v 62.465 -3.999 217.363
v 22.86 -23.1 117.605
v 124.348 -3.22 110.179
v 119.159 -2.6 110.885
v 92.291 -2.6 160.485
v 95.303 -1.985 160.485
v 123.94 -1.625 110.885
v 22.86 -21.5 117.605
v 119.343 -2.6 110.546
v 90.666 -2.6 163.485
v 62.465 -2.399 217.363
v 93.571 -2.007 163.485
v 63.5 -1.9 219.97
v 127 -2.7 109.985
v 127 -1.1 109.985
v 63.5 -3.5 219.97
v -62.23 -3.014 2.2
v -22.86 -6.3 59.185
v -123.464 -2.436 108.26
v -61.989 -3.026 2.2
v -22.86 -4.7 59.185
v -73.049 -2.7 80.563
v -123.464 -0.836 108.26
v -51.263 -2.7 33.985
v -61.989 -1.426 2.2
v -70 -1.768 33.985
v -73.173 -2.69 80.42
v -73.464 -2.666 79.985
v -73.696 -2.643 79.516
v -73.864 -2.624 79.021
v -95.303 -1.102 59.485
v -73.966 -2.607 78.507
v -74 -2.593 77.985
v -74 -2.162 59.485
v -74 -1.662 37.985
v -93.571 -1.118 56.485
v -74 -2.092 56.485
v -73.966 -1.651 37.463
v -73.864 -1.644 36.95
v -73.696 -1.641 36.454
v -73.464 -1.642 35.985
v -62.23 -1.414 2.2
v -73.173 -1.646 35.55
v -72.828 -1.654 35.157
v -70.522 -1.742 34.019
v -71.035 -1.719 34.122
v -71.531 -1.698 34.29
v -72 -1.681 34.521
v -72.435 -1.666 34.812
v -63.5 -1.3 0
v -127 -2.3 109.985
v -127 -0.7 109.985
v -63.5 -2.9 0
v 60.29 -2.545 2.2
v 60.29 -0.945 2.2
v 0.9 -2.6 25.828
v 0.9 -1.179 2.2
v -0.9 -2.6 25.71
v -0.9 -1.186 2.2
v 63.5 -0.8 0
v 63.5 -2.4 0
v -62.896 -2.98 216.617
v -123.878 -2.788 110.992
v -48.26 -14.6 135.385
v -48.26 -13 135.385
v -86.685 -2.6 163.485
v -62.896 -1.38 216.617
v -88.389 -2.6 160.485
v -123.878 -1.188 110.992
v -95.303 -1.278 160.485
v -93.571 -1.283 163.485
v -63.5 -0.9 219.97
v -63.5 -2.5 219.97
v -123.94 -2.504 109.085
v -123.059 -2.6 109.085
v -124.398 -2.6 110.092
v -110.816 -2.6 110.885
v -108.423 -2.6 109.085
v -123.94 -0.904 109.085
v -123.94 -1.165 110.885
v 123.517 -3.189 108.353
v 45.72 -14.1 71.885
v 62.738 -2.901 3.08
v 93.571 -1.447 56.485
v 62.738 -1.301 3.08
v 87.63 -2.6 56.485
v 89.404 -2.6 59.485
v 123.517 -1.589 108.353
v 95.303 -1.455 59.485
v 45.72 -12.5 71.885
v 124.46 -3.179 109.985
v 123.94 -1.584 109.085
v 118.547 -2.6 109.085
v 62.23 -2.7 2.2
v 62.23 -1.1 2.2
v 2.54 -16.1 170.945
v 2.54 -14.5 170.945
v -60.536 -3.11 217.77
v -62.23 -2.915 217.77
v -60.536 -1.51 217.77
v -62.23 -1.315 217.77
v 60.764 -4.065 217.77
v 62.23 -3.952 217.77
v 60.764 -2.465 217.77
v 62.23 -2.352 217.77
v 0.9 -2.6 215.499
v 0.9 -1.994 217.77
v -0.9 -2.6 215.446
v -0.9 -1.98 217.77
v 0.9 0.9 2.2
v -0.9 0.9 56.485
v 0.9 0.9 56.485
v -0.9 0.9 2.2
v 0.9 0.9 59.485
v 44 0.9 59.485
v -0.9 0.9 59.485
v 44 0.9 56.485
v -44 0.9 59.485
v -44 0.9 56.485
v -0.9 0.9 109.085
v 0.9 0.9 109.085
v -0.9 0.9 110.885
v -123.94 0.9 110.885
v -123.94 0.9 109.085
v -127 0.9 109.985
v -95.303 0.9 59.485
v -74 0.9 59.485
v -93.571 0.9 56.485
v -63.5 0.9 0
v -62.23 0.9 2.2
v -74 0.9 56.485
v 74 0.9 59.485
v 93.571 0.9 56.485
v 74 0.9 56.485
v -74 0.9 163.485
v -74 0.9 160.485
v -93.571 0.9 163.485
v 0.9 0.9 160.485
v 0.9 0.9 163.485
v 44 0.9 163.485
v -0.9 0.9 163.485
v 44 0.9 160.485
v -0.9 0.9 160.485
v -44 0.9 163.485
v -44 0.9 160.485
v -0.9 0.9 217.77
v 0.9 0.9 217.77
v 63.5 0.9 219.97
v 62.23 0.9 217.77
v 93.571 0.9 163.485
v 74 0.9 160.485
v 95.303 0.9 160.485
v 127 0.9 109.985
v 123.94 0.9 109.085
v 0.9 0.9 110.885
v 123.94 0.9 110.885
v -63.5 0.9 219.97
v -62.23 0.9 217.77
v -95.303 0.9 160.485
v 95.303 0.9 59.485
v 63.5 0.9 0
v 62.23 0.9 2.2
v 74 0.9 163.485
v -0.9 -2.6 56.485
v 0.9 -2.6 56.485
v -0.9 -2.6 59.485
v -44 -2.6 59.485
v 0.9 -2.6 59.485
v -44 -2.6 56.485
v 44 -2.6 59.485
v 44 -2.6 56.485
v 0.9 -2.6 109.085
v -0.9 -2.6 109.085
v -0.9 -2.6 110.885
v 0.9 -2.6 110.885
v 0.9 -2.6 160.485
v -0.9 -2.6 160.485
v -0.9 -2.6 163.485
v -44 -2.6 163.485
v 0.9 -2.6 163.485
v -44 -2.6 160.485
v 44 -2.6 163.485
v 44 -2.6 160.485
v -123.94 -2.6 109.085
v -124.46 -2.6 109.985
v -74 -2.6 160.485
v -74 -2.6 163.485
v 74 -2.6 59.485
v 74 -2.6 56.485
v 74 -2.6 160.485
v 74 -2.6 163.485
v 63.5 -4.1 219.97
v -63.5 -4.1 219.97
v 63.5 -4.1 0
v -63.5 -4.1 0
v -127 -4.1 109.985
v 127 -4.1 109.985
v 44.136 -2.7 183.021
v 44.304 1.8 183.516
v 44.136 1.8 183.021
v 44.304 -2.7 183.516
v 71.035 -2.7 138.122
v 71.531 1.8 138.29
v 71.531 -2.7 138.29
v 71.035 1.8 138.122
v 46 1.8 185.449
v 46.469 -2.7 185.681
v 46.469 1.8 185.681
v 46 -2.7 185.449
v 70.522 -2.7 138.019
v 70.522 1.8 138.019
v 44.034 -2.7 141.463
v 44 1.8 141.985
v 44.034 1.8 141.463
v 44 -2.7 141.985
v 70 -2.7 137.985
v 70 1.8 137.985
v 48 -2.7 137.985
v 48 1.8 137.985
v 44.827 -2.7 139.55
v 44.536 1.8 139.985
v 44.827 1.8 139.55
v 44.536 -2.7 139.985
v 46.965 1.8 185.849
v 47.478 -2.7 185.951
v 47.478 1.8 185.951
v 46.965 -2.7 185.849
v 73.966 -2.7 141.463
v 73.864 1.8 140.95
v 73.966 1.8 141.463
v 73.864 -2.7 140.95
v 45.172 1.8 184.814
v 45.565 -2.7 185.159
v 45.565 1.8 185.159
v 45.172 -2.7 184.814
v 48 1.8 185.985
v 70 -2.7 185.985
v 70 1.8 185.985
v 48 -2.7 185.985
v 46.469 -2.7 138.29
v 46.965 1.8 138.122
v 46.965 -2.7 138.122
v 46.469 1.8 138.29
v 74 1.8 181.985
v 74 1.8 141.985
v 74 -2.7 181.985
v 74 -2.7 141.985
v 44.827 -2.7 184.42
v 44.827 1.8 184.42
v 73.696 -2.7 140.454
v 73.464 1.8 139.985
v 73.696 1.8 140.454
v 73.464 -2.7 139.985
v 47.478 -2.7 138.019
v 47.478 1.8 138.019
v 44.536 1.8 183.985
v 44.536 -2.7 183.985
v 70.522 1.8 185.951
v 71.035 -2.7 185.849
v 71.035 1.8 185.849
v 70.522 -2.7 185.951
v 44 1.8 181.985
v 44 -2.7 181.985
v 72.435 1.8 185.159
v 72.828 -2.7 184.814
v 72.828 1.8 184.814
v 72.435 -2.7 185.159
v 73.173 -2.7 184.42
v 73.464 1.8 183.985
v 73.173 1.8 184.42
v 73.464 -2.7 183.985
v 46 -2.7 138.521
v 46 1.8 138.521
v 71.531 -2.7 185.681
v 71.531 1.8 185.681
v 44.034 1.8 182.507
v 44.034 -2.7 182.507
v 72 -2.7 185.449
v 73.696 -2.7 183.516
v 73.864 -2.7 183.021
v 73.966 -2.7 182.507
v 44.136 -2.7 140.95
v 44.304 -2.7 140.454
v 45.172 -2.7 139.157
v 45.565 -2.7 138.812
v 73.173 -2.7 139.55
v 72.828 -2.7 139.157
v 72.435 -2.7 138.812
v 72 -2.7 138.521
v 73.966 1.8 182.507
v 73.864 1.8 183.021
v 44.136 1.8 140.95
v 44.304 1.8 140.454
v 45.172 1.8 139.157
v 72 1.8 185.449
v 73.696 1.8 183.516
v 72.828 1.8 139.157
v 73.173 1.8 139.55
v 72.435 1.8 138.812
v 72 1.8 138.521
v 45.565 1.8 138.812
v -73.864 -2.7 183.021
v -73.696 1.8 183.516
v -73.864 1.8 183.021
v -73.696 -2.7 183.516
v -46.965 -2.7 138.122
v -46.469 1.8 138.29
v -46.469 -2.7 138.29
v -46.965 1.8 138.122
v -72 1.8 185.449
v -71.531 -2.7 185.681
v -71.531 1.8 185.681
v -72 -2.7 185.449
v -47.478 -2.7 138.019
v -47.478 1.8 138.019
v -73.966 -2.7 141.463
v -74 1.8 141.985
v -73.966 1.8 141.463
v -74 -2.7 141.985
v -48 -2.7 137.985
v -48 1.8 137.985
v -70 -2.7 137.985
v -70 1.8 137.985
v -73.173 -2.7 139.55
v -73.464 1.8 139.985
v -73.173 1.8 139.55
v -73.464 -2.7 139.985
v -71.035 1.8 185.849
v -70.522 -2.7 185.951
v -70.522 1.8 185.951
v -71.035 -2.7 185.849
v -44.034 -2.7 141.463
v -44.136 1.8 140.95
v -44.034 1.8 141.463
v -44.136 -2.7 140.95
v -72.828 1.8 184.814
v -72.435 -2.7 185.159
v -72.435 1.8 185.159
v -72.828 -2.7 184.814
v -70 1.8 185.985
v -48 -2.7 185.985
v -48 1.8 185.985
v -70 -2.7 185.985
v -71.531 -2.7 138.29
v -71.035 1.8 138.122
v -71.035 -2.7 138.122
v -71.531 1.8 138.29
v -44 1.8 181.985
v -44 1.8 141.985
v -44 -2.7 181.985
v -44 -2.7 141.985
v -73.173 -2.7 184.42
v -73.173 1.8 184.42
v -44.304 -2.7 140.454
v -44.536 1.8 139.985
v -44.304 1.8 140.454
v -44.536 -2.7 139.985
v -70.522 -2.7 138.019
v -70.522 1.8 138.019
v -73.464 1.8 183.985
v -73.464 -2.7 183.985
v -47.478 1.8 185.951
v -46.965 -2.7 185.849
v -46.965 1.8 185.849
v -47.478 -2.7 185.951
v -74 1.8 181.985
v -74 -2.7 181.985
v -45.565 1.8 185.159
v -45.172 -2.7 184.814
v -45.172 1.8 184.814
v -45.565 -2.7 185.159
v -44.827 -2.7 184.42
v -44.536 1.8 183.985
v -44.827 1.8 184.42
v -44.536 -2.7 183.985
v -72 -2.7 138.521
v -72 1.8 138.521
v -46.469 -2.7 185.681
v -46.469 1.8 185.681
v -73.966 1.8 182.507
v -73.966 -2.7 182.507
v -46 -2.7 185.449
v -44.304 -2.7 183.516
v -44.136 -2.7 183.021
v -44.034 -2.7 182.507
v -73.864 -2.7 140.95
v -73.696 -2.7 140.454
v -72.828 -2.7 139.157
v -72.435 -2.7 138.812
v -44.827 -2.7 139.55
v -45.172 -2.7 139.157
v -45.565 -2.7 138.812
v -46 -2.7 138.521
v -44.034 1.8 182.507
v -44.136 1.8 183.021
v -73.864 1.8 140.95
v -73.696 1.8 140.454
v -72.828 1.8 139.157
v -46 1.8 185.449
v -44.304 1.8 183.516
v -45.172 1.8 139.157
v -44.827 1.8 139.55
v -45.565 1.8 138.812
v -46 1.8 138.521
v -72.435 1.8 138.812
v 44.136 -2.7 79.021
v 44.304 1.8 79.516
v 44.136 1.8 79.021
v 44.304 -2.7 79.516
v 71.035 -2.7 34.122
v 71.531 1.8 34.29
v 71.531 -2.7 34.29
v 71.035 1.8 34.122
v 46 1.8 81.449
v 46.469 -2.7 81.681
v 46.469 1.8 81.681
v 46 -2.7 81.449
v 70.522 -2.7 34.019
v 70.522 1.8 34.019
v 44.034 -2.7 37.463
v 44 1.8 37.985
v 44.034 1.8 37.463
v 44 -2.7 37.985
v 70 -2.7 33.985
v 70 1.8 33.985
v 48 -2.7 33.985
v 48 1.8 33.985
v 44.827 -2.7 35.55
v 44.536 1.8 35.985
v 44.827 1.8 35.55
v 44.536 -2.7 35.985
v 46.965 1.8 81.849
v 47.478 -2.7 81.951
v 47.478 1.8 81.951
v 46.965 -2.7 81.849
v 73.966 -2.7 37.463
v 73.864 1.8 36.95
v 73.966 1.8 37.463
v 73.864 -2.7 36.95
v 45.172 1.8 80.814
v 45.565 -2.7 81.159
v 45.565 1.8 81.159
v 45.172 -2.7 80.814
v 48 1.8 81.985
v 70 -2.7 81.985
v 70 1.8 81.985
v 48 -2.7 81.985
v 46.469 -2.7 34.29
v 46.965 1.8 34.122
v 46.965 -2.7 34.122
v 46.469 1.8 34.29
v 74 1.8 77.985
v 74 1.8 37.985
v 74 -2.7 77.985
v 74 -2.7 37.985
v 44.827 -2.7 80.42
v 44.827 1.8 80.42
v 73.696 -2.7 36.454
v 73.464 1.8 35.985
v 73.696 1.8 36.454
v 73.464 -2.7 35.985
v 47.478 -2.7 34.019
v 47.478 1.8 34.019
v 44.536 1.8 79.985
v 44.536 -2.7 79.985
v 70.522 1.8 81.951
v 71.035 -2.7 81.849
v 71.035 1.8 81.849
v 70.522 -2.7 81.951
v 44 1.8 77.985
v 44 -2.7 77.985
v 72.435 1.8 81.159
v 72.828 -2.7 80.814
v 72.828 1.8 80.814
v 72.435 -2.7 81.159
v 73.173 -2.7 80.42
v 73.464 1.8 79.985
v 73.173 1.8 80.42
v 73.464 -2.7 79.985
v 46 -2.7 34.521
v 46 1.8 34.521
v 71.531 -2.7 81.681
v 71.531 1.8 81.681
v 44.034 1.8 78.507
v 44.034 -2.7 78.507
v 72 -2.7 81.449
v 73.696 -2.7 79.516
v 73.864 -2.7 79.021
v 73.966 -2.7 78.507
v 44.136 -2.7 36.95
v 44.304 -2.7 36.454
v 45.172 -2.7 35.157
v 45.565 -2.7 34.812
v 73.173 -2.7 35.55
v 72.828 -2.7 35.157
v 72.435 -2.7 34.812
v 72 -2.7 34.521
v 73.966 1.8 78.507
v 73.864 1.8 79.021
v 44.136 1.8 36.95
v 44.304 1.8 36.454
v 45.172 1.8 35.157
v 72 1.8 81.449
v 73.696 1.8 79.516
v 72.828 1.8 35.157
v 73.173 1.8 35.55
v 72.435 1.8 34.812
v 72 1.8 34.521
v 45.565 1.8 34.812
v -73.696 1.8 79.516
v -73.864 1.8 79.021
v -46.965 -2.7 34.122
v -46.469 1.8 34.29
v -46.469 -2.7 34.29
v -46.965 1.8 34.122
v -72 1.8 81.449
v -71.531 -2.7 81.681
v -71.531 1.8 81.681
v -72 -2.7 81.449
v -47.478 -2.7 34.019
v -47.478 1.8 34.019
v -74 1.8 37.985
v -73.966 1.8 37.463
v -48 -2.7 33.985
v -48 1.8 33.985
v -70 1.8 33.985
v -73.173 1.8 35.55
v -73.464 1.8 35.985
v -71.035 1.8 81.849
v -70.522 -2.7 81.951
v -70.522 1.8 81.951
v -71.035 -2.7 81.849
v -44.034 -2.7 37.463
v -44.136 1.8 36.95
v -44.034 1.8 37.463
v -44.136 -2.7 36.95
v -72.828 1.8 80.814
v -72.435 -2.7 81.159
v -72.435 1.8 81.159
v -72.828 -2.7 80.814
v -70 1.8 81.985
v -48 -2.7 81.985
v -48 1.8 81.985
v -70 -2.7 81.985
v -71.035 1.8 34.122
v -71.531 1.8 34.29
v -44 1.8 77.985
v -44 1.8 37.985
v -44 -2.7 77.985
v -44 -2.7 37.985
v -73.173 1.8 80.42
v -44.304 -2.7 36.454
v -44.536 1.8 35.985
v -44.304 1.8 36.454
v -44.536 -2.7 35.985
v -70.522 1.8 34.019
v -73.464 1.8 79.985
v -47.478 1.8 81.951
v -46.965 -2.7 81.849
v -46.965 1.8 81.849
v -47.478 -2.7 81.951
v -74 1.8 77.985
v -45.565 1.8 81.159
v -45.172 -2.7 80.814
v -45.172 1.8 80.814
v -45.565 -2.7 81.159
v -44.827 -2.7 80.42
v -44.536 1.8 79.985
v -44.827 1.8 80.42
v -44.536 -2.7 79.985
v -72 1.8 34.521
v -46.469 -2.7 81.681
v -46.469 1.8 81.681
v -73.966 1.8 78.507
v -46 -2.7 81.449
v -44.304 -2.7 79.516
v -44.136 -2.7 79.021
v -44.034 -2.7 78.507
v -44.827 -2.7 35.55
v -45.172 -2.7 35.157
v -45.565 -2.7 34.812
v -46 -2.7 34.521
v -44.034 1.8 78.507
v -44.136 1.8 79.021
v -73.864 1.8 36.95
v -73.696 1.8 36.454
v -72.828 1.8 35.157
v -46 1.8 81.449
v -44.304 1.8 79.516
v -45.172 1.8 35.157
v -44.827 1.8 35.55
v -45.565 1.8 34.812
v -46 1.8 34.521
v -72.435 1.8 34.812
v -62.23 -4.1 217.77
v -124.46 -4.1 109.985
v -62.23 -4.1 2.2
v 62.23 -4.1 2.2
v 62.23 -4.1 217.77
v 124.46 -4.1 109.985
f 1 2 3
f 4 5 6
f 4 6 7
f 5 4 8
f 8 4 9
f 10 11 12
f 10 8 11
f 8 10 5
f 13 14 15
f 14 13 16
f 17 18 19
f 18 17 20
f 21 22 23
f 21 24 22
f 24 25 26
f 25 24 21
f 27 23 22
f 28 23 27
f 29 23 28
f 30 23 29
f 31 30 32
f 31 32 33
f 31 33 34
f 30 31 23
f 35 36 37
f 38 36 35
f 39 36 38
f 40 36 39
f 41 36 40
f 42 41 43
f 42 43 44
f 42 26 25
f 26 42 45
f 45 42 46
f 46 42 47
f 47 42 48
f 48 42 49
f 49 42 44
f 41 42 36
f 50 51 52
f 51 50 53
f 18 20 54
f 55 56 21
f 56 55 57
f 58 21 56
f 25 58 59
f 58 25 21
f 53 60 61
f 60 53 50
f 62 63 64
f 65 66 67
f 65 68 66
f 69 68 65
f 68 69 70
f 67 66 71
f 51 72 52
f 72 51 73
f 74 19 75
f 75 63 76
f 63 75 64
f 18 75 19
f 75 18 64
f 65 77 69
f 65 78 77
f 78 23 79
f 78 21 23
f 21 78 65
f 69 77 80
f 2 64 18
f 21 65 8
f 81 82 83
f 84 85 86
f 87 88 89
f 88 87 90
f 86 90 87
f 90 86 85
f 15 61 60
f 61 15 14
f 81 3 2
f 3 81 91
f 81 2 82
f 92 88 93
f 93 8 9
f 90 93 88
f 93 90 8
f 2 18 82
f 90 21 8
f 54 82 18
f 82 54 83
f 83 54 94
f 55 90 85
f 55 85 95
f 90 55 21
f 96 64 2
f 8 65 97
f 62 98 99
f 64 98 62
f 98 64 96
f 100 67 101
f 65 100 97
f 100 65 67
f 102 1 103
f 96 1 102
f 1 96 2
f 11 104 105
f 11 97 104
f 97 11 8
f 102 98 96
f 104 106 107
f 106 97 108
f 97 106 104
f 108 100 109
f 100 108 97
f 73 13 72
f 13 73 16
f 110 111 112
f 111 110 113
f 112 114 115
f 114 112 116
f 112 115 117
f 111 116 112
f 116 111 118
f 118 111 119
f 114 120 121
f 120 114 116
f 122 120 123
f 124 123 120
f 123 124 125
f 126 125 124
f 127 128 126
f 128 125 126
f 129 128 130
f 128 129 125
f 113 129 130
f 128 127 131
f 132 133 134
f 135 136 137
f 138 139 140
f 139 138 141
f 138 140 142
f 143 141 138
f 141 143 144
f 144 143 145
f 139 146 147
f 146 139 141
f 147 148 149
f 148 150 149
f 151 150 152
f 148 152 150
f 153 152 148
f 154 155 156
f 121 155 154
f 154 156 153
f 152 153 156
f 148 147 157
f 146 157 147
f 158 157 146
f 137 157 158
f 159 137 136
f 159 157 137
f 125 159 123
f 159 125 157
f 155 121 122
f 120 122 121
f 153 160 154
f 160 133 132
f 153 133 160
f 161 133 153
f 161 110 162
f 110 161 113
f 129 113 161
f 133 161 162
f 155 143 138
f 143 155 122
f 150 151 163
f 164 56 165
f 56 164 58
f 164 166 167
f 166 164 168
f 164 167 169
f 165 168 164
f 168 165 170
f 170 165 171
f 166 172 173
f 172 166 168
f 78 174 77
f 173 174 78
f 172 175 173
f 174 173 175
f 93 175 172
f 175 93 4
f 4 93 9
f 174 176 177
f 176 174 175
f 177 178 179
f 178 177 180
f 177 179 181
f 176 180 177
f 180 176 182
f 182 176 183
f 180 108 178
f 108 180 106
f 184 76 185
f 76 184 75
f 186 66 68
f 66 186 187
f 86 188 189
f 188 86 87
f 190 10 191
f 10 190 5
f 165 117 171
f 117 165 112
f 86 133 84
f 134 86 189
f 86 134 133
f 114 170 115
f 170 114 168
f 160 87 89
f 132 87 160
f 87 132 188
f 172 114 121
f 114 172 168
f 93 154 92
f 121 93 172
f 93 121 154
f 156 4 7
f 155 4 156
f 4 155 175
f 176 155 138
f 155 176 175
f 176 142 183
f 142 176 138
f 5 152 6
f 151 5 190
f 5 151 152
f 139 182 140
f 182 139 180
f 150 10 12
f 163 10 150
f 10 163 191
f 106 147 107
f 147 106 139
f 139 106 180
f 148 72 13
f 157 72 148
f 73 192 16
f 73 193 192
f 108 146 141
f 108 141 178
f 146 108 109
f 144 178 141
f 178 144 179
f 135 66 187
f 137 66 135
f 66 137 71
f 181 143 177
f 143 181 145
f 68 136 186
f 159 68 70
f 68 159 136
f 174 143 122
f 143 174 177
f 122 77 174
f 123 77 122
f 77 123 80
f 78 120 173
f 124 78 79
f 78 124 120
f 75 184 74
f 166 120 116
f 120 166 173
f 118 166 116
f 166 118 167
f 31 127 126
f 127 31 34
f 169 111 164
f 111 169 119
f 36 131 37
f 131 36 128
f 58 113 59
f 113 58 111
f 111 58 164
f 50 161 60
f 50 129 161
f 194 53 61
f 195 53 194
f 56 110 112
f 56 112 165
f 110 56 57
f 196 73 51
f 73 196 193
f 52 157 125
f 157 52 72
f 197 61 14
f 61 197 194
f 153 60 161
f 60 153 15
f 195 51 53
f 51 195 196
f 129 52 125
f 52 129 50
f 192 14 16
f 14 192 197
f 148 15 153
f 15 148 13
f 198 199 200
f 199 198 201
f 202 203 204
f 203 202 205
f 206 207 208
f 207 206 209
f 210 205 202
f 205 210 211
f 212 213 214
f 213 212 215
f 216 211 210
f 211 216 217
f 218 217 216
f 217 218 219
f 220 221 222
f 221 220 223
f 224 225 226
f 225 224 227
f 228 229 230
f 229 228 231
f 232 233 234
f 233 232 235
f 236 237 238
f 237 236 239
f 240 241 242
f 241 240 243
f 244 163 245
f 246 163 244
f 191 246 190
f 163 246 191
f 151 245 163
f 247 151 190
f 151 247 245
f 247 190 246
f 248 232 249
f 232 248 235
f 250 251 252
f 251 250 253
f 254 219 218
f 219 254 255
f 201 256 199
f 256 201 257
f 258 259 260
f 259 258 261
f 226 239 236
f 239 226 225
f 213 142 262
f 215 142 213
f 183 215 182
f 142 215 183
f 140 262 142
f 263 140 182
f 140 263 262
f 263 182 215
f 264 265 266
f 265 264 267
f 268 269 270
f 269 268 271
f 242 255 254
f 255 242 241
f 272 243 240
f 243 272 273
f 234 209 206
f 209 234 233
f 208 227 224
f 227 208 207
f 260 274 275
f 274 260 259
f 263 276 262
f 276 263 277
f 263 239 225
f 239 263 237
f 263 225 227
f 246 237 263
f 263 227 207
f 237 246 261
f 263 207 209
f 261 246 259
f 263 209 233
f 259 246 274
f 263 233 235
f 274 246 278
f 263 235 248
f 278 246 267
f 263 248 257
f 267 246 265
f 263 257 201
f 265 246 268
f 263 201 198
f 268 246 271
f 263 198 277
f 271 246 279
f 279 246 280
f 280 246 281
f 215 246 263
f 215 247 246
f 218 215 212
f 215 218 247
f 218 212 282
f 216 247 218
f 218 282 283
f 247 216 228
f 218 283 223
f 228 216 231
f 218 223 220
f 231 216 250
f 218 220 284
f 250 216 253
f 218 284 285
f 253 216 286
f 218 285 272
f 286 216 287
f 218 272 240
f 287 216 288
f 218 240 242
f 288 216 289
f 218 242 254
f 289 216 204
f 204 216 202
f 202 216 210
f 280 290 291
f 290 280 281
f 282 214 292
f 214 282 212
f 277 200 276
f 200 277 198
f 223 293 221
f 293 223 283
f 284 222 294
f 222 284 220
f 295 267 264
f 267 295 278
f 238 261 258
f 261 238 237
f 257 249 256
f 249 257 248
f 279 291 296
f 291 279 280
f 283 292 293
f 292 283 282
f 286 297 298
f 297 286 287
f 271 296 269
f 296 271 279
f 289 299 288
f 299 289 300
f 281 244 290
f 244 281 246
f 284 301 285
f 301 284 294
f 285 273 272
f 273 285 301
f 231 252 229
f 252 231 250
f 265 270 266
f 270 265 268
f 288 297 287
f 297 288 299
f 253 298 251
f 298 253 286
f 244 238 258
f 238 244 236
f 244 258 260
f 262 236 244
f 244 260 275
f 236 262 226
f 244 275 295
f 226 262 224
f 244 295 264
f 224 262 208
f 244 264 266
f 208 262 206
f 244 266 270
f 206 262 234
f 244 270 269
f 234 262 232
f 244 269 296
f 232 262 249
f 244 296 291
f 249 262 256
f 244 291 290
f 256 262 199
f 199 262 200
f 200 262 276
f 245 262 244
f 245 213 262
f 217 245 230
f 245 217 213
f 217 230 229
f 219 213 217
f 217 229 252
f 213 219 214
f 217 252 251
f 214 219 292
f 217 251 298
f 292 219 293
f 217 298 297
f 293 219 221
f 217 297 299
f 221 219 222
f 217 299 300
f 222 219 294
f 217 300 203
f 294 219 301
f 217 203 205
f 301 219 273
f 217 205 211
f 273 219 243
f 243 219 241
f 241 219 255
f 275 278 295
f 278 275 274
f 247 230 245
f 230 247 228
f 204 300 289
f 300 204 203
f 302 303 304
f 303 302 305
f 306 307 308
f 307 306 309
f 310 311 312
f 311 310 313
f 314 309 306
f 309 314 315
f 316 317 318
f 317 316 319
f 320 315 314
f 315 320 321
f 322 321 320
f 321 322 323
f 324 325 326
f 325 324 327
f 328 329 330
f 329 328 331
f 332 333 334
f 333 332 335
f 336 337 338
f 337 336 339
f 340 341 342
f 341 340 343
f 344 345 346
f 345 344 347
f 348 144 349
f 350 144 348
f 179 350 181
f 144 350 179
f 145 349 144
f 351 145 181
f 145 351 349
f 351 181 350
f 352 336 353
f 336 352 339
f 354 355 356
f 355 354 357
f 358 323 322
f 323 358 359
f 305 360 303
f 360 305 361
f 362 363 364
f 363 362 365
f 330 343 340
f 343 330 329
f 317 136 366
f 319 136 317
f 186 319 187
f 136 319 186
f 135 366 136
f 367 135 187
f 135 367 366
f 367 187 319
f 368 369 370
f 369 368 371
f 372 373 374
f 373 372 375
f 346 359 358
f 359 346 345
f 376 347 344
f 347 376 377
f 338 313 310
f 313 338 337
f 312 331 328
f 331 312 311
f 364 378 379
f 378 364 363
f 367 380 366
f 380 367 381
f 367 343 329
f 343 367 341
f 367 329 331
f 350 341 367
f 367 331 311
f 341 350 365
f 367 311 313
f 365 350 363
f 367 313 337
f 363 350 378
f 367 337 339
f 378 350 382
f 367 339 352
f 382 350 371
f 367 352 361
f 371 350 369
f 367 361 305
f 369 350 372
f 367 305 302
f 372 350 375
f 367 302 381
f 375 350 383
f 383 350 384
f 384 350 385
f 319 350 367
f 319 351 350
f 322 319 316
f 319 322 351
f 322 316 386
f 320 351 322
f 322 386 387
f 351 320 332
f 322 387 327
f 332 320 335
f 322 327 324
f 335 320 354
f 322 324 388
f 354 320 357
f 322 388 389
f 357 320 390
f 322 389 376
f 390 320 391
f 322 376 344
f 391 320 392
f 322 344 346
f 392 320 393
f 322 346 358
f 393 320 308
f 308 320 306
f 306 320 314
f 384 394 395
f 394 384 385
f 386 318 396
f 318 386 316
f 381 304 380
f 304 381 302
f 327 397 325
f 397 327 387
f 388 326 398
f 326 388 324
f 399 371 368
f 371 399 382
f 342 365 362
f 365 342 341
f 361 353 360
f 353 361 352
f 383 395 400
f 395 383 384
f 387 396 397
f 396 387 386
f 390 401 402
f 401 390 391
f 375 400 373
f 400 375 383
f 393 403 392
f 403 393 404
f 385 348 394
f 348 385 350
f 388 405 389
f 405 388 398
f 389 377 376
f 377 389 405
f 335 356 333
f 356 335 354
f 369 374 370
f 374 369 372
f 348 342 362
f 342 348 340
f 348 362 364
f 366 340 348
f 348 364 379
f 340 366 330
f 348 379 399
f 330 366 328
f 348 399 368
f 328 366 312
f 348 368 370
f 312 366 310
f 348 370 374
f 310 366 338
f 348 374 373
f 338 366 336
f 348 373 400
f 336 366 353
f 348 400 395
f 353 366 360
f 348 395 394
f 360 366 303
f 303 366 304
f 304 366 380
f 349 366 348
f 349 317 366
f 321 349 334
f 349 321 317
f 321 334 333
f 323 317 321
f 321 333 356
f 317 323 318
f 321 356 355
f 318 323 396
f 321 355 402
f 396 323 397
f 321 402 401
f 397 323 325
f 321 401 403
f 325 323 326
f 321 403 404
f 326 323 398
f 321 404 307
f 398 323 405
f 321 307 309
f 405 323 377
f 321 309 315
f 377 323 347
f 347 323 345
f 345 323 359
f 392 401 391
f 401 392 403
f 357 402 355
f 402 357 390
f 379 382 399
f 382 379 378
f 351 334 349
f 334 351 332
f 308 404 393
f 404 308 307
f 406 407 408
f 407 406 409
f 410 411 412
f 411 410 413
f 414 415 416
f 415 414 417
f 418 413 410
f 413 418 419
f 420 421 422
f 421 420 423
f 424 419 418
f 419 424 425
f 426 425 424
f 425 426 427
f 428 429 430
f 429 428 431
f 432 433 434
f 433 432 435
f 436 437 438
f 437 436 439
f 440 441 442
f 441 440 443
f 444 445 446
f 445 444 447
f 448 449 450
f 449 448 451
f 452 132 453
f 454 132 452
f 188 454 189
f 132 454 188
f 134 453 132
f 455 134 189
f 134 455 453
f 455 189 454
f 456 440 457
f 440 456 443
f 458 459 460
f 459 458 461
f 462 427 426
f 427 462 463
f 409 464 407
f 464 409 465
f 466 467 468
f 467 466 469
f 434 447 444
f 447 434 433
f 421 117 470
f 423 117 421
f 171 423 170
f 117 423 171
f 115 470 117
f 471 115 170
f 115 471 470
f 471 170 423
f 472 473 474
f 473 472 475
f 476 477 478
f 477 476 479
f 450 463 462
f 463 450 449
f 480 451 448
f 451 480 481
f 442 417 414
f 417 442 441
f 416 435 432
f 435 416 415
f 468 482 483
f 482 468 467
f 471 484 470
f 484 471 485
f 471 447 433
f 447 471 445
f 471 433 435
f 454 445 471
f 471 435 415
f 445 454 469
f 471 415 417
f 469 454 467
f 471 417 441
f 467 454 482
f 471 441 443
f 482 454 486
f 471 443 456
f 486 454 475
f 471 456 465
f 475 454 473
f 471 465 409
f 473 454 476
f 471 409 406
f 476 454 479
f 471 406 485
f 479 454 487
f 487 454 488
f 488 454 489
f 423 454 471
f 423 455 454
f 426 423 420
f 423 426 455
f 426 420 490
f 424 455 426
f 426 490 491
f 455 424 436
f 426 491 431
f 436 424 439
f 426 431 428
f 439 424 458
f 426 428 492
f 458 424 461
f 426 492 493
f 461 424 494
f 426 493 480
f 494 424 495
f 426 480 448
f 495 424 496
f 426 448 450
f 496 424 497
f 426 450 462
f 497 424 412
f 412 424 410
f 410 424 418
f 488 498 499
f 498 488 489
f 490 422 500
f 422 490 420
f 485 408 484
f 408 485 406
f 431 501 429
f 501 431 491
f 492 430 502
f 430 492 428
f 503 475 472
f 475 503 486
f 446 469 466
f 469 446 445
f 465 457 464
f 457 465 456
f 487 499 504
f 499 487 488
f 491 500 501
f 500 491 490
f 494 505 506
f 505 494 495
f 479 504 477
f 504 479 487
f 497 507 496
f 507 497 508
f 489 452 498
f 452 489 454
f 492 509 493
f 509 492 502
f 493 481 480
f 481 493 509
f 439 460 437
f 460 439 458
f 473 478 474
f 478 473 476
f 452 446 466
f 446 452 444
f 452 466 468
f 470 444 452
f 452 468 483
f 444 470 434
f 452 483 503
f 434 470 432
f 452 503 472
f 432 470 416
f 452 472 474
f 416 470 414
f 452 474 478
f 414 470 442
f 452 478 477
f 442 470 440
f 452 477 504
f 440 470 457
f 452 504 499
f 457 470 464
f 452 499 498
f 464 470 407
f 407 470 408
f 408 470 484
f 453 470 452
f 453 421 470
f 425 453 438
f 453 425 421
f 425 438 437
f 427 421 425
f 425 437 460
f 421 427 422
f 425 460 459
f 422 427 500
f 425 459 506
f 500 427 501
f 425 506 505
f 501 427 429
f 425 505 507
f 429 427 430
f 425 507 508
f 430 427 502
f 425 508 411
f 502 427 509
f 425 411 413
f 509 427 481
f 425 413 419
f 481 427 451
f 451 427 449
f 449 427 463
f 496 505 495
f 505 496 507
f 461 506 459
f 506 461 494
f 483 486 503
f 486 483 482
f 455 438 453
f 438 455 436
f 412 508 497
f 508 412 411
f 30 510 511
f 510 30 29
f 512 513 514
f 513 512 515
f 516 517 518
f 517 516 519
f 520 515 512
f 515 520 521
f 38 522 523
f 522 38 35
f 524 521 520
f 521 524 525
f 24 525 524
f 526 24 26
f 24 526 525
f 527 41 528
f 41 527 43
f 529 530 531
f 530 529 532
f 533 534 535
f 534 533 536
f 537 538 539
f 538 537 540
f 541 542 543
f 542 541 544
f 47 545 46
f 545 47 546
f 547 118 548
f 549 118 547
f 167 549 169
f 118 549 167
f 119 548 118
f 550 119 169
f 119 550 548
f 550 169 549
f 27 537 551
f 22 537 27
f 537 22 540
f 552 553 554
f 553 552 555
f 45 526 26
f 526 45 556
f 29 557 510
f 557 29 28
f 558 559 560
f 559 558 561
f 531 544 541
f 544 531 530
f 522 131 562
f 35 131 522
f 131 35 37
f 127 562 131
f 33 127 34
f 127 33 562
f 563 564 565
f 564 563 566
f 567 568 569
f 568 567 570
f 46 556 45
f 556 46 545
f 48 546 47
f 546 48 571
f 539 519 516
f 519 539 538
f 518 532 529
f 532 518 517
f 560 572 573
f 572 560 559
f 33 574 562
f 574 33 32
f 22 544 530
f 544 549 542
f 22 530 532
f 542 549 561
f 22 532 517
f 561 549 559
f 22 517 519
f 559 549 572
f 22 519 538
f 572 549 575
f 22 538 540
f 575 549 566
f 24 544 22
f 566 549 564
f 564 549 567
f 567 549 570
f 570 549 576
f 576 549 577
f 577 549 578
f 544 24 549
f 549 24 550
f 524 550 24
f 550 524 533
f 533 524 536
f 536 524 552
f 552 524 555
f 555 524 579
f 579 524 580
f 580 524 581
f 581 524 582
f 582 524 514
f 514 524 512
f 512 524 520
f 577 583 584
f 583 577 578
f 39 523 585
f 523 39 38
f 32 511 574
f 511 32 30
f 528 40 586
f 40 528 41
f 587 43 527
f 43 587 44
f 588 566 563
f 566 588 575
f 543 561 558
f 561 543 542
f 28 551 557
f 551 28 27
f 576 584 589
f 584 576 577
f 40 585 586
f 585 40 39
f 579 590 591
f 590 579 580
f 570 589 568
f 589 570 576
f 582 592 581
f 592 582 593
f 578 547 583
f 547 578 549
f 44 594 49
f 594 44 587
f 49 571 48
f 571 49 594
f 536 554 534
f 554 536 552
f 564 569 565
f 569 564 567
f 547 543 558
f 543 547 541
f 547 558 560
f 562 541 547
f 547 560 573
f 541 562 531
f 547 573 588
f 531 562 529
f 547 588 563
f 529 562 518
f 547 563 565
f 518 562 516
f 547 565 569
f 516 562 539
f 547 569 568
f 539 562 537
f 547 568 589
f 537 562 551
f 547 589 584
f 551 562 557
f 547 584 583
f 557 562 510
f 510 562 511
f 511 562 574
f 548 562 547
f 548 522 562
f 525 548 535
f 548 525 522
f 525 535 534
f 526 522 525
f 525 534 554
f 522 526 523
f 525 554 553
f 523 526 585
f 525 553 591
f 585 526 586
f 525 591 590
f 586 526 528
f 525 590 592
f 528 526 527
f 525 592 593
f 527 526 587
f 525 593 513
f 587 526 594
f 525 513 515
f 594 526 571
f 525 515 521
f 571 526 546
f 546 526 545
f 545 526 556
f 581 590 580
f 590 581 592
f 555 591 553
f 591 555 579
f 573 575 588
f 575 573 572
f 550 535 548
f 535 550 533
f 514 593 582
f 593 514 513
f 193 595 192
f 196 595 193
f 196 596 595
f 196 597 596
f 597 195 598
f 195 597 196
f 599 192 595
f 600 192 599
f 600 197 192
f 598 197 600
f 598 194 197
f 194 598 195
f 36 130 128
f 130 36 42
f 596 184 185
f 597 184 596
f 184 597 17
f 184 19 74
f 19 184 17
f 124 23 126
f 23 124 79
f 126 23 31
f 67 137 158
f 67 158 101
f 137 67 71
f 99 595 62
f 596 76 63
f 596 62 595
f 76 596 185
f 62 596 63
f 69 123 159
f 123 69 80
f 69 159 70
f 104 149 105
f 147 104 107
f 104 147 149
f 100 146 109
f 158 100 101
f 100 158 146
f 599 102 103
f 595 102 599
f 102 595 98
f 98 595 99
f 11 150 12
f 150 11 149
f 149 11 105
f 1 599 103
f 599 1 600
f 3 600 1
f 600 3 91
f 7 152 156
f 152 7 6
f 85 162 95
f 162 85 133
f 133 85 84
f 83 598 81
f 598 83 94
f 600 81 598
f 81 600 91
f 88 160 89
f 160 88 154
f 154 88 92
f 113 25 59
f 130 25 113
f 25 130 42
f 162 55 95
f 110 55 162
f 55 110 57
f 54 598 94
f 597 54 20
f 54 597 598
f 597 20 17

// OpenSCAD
/*
  Parametric Faceted Hex Wall Tile v17
  -----------------------------------
  Goals:
    - 10 in point-to-point regular hex by default
    - stronger asymmetric low-poly relief
    - open-back shell for lower weight / faster printing
    - four hidden shallow adhesive mounting pads
    - no perimeter tabs or ears
    - vertical export orientation with a full flat edge on the bed
    - mount load rails separated from general stiffening ribs

  Units: millimeters
*/

$fn = 48;

// ============================================================
// A) GLOBAL QUALITY / EXPORT
// ============================================================
render_orientation  = "vertical"; // "flat" or "vertical"

// ============================================================
// B) TILE SIZE
// ============================================================
point_to_point      = 254.0;   // 10.000 in; left vertex to right vertex

// ============================================================
// C) FACE / RELIEF
// ============================================================
roof_skin           = 1.60;    // vertical skin thickness
edge_relief         = 3.20;    // lower perimeter makes the planes read more strongly
peak_relief         = 24.00;   // dominant architectural peak
secondary_relief    = 15.50;
low_relief          = 7.20;

// Fine-tune the six outer corners clockwise from rightmost.
corner_z = [
    edge_relief + 0.4,  // right
    edge_relief + 1.2,  // upper-right
    edge_relief + 0.2,  // upper-left
    edge_relief + 0.0,  // left
    edge_relief + 0.6,  // lower-left
    edge_relief + 0.1   // lower-right
];

// ============================================================
// D) SHELL
// ============================================================
perimeter_wall      = 2.20;    // wall thickness measured inward
wall_height         = 5.00;    // ensures positive overlap with roof underside

// ============================================================
// E) STRUCTURAL RIBS
// ============================================================
add_cross_ribs      = true;
add_mount_rails     = true;
cross_rib_width     = 1.80;    // general anti-twist ribs
mount_rail_width    = 3.00;    // wider rails carry adhesive-pad loads
rib_height          = 3.50;

// ============================================================
// F) HIDDEN ADHESIVE MOUNTS
// ============================================================
mounts_enabled      = true;
mount_pad_width     = 30.0;
mount_pad_height    = 48.0;
mount_pad_radius    = 4.0;
mount_pad_proud     = 0.90;    // how far pad face sits behind rear plane
mount_core_height   = 3.60;    // core overlaps the structural rails for a positive union
mount_x_offset      = 59.0;
mount_y_offset      = 52.0;

// ============================================================
// G) NUMERICAL / BOOLEAN TOLERANCES
// ============================================================
eps                 = 0.02;

// ============================================================
// H) ADVANCED FACET LAYOUT / DERIVED DIMENSIONS
// ============================================================
R = point_to_point / 2;
H = R * sqrt(3) / 2;
flat_to_flat = 2 * H;

// Normalized XY point set. 0..5 are the regular-hex perimeter.
// 6..10 are deliberately asymmetric interior control points.
xy_norm = [
    [ 1.00,  0.00],
    [ 0.50,  0.8660254038],
    [-0.50,  0.8660254038],
    [-1.00,  0.00],
    [-0.50, -0.8660254038],
    [ 0.50, -0.8660254038],
    [ 0.18,  0.06],   // dominant peak control, pushed off-center
    [-0.38,  0.20],   // left shoulder
    [ 0.36, -0.30],   // lower-right ridge
    [-0.18, -0.40],   // lower basin/transition
    [ 0.02,  0.48]    // upper secondary ridge
];

// Delaunay-style triangulation over the six perimeter and five interior points.
triangles = [
    [1,6,0],
    [4,9,3],
    [5,9,4],
    [7,2,3],
    [9,7,3],
    [7,9,6],
    [8,5,0],
    [6,8,0],
    [9,8,6],
    [5,8,9],
    [10,7,6],
    [7,10,2],
    [1,10,6],
    [2,10,1]
];

// Relief values for all 11 points.
// Interior values are intentionally non-radial to avoid a centered "tent" look.
z_values = [
    corner_z[0],
    corner_z[1],
    corner_z[2],
    corner_z[3],
    corner_z[4],
    corner_z[5],
    peak_relief,              // 6 - dominant peak, slightly right/below center
    secondary_relief,         // 7 - left shoulder
    secondary_relief - 0.5,   // 8 - lower-right ridge
    low_relief,               // 9 - lower transition
    secondary_relief + 1.5    // 10 - upper ridge
];

function pxy(i) = [xy_norm[i][0] * R, xy_norm[i][1] * R];
function p3(i, dz=0) = [pxy(i)[0], pxy(i)[1], z_values[i] + dz];

module hex2d(inset=0) {
    if (inset == 0)
        polygon(points=[for (i=[0:5]) pxy(i)]);
    else
        offset(delta=-inset)
            polygon(points=[for (i=[0:5]) pxy(i)]);
}

module rounded_rect_2d(w, h, r) {
    // offset/square construction stays stable for parameter changes.
    offset(r=r)
        square([max(eps, w-2*r), max(eps, h-2*r)], center=true);
}

module facet_wedge(a, b, c) {
    // A thin, vertically offset triangular roof panel.
    // Unioning all wedges gives a continuous faceted skin.
    pts = [
        p3(a), p3(b), p3(c),
        p3(a, -roof_skin), p3(b, -roof_skin), p3(c, -roof_skin)
    ];

    polyhedron(
        points=pts,
        faces=[
            [0,1,2],      // top
            [5,4,3],      // underside
            [0,3,4,1],
            [1,4,5,2],
            [2,5,3,0]
        ],
        convexity=8
    );
}

module roof_skin_mesh() {
    union() {
        for (t = triangles)
            facet_wedge(t[0], t[1], t[2]);
    }
}

module perimeter_ring() {
    linear_extrude(height=wall_height)
        difference() {
            hex2d();
            hex2d(perimeter_wall);
        }
}

module rear_mount(x, y) {
    // Rear adhesive face is only mount_pad_proud behind the global rear plane.
    // Pads intersect the structural mounting rails.
    // Rails distribute mounting load into the perimeter shell.
    translate([x, y, -mount_pad_proud])
        linear_extrude(height=mount_core_height + mount_pad_proud)
            rounded_rect_2d(mount_pad_width, mount_pad_height, mount_pad_radius);
}

module structural_ribs() {
    // General ribs stabilize the open shell; wider mount rails tie the
    // adhesive pads mechanically into the perimeter.
    if (add_cross_ribs || add_mount_rails) {
        intersection() {
            linear_extrude(height=rib_height)
                union() {
                    if (add_cross_ribs) {
                        square([point_to_point, cross_rib_width], center=true);
                        square([cross_rib_width, flat_to_flat], center=true);
                    }

                    if (add_mount_rails) {
                        // These rails pass directly through the four pad centers
                        // and reach the perimeter ring at both ends.
                        translate([0, mount_y_offset])
                            square([point_to_point, mount_rail_width], center=true);
                        translate([0, -mount_y_offset])
                            square([point_to_point, mount_rail_width], center=true);
                    }
                }
            linear_extrude(height=rib_height)
                hex2d();
        }
    }
}

module tile_flat() {
    union() {
        roof_skin_mesh();
        perimeter_ring();
        structural_ribs();

        if (mounts_enabled) {
            rear_mount( mount_x_offset,  mount_y_offset);
            rear_mount(-mount_x_offset,  mount_y_offset);
            rear_mount( mount_x_offset, -mount_y_offset);
            rear_mount(-mount_x_offset, -mount_y_offset);
        }
    }
}

module final_model() {
    if (render_orientation == "vertical") {
        // Rotate so the original lower flat of the hex becomes the print-bed edge.
        // Move rear-most adhesive faces up to Y=0 for predictable slicer placement.
        translate([0, mount_pad_proud, H])
            rotate([90,0,0])
                tile_flat();
    } else {
        tile_flat();
    }
}

final_model();

// Expected default overall flat dimensions (v17 bold-relief face):
// point-to-point = 254.00 mm (10.000 in)
// flat-to-flat   = ~219.97 mm (8.660 in)
